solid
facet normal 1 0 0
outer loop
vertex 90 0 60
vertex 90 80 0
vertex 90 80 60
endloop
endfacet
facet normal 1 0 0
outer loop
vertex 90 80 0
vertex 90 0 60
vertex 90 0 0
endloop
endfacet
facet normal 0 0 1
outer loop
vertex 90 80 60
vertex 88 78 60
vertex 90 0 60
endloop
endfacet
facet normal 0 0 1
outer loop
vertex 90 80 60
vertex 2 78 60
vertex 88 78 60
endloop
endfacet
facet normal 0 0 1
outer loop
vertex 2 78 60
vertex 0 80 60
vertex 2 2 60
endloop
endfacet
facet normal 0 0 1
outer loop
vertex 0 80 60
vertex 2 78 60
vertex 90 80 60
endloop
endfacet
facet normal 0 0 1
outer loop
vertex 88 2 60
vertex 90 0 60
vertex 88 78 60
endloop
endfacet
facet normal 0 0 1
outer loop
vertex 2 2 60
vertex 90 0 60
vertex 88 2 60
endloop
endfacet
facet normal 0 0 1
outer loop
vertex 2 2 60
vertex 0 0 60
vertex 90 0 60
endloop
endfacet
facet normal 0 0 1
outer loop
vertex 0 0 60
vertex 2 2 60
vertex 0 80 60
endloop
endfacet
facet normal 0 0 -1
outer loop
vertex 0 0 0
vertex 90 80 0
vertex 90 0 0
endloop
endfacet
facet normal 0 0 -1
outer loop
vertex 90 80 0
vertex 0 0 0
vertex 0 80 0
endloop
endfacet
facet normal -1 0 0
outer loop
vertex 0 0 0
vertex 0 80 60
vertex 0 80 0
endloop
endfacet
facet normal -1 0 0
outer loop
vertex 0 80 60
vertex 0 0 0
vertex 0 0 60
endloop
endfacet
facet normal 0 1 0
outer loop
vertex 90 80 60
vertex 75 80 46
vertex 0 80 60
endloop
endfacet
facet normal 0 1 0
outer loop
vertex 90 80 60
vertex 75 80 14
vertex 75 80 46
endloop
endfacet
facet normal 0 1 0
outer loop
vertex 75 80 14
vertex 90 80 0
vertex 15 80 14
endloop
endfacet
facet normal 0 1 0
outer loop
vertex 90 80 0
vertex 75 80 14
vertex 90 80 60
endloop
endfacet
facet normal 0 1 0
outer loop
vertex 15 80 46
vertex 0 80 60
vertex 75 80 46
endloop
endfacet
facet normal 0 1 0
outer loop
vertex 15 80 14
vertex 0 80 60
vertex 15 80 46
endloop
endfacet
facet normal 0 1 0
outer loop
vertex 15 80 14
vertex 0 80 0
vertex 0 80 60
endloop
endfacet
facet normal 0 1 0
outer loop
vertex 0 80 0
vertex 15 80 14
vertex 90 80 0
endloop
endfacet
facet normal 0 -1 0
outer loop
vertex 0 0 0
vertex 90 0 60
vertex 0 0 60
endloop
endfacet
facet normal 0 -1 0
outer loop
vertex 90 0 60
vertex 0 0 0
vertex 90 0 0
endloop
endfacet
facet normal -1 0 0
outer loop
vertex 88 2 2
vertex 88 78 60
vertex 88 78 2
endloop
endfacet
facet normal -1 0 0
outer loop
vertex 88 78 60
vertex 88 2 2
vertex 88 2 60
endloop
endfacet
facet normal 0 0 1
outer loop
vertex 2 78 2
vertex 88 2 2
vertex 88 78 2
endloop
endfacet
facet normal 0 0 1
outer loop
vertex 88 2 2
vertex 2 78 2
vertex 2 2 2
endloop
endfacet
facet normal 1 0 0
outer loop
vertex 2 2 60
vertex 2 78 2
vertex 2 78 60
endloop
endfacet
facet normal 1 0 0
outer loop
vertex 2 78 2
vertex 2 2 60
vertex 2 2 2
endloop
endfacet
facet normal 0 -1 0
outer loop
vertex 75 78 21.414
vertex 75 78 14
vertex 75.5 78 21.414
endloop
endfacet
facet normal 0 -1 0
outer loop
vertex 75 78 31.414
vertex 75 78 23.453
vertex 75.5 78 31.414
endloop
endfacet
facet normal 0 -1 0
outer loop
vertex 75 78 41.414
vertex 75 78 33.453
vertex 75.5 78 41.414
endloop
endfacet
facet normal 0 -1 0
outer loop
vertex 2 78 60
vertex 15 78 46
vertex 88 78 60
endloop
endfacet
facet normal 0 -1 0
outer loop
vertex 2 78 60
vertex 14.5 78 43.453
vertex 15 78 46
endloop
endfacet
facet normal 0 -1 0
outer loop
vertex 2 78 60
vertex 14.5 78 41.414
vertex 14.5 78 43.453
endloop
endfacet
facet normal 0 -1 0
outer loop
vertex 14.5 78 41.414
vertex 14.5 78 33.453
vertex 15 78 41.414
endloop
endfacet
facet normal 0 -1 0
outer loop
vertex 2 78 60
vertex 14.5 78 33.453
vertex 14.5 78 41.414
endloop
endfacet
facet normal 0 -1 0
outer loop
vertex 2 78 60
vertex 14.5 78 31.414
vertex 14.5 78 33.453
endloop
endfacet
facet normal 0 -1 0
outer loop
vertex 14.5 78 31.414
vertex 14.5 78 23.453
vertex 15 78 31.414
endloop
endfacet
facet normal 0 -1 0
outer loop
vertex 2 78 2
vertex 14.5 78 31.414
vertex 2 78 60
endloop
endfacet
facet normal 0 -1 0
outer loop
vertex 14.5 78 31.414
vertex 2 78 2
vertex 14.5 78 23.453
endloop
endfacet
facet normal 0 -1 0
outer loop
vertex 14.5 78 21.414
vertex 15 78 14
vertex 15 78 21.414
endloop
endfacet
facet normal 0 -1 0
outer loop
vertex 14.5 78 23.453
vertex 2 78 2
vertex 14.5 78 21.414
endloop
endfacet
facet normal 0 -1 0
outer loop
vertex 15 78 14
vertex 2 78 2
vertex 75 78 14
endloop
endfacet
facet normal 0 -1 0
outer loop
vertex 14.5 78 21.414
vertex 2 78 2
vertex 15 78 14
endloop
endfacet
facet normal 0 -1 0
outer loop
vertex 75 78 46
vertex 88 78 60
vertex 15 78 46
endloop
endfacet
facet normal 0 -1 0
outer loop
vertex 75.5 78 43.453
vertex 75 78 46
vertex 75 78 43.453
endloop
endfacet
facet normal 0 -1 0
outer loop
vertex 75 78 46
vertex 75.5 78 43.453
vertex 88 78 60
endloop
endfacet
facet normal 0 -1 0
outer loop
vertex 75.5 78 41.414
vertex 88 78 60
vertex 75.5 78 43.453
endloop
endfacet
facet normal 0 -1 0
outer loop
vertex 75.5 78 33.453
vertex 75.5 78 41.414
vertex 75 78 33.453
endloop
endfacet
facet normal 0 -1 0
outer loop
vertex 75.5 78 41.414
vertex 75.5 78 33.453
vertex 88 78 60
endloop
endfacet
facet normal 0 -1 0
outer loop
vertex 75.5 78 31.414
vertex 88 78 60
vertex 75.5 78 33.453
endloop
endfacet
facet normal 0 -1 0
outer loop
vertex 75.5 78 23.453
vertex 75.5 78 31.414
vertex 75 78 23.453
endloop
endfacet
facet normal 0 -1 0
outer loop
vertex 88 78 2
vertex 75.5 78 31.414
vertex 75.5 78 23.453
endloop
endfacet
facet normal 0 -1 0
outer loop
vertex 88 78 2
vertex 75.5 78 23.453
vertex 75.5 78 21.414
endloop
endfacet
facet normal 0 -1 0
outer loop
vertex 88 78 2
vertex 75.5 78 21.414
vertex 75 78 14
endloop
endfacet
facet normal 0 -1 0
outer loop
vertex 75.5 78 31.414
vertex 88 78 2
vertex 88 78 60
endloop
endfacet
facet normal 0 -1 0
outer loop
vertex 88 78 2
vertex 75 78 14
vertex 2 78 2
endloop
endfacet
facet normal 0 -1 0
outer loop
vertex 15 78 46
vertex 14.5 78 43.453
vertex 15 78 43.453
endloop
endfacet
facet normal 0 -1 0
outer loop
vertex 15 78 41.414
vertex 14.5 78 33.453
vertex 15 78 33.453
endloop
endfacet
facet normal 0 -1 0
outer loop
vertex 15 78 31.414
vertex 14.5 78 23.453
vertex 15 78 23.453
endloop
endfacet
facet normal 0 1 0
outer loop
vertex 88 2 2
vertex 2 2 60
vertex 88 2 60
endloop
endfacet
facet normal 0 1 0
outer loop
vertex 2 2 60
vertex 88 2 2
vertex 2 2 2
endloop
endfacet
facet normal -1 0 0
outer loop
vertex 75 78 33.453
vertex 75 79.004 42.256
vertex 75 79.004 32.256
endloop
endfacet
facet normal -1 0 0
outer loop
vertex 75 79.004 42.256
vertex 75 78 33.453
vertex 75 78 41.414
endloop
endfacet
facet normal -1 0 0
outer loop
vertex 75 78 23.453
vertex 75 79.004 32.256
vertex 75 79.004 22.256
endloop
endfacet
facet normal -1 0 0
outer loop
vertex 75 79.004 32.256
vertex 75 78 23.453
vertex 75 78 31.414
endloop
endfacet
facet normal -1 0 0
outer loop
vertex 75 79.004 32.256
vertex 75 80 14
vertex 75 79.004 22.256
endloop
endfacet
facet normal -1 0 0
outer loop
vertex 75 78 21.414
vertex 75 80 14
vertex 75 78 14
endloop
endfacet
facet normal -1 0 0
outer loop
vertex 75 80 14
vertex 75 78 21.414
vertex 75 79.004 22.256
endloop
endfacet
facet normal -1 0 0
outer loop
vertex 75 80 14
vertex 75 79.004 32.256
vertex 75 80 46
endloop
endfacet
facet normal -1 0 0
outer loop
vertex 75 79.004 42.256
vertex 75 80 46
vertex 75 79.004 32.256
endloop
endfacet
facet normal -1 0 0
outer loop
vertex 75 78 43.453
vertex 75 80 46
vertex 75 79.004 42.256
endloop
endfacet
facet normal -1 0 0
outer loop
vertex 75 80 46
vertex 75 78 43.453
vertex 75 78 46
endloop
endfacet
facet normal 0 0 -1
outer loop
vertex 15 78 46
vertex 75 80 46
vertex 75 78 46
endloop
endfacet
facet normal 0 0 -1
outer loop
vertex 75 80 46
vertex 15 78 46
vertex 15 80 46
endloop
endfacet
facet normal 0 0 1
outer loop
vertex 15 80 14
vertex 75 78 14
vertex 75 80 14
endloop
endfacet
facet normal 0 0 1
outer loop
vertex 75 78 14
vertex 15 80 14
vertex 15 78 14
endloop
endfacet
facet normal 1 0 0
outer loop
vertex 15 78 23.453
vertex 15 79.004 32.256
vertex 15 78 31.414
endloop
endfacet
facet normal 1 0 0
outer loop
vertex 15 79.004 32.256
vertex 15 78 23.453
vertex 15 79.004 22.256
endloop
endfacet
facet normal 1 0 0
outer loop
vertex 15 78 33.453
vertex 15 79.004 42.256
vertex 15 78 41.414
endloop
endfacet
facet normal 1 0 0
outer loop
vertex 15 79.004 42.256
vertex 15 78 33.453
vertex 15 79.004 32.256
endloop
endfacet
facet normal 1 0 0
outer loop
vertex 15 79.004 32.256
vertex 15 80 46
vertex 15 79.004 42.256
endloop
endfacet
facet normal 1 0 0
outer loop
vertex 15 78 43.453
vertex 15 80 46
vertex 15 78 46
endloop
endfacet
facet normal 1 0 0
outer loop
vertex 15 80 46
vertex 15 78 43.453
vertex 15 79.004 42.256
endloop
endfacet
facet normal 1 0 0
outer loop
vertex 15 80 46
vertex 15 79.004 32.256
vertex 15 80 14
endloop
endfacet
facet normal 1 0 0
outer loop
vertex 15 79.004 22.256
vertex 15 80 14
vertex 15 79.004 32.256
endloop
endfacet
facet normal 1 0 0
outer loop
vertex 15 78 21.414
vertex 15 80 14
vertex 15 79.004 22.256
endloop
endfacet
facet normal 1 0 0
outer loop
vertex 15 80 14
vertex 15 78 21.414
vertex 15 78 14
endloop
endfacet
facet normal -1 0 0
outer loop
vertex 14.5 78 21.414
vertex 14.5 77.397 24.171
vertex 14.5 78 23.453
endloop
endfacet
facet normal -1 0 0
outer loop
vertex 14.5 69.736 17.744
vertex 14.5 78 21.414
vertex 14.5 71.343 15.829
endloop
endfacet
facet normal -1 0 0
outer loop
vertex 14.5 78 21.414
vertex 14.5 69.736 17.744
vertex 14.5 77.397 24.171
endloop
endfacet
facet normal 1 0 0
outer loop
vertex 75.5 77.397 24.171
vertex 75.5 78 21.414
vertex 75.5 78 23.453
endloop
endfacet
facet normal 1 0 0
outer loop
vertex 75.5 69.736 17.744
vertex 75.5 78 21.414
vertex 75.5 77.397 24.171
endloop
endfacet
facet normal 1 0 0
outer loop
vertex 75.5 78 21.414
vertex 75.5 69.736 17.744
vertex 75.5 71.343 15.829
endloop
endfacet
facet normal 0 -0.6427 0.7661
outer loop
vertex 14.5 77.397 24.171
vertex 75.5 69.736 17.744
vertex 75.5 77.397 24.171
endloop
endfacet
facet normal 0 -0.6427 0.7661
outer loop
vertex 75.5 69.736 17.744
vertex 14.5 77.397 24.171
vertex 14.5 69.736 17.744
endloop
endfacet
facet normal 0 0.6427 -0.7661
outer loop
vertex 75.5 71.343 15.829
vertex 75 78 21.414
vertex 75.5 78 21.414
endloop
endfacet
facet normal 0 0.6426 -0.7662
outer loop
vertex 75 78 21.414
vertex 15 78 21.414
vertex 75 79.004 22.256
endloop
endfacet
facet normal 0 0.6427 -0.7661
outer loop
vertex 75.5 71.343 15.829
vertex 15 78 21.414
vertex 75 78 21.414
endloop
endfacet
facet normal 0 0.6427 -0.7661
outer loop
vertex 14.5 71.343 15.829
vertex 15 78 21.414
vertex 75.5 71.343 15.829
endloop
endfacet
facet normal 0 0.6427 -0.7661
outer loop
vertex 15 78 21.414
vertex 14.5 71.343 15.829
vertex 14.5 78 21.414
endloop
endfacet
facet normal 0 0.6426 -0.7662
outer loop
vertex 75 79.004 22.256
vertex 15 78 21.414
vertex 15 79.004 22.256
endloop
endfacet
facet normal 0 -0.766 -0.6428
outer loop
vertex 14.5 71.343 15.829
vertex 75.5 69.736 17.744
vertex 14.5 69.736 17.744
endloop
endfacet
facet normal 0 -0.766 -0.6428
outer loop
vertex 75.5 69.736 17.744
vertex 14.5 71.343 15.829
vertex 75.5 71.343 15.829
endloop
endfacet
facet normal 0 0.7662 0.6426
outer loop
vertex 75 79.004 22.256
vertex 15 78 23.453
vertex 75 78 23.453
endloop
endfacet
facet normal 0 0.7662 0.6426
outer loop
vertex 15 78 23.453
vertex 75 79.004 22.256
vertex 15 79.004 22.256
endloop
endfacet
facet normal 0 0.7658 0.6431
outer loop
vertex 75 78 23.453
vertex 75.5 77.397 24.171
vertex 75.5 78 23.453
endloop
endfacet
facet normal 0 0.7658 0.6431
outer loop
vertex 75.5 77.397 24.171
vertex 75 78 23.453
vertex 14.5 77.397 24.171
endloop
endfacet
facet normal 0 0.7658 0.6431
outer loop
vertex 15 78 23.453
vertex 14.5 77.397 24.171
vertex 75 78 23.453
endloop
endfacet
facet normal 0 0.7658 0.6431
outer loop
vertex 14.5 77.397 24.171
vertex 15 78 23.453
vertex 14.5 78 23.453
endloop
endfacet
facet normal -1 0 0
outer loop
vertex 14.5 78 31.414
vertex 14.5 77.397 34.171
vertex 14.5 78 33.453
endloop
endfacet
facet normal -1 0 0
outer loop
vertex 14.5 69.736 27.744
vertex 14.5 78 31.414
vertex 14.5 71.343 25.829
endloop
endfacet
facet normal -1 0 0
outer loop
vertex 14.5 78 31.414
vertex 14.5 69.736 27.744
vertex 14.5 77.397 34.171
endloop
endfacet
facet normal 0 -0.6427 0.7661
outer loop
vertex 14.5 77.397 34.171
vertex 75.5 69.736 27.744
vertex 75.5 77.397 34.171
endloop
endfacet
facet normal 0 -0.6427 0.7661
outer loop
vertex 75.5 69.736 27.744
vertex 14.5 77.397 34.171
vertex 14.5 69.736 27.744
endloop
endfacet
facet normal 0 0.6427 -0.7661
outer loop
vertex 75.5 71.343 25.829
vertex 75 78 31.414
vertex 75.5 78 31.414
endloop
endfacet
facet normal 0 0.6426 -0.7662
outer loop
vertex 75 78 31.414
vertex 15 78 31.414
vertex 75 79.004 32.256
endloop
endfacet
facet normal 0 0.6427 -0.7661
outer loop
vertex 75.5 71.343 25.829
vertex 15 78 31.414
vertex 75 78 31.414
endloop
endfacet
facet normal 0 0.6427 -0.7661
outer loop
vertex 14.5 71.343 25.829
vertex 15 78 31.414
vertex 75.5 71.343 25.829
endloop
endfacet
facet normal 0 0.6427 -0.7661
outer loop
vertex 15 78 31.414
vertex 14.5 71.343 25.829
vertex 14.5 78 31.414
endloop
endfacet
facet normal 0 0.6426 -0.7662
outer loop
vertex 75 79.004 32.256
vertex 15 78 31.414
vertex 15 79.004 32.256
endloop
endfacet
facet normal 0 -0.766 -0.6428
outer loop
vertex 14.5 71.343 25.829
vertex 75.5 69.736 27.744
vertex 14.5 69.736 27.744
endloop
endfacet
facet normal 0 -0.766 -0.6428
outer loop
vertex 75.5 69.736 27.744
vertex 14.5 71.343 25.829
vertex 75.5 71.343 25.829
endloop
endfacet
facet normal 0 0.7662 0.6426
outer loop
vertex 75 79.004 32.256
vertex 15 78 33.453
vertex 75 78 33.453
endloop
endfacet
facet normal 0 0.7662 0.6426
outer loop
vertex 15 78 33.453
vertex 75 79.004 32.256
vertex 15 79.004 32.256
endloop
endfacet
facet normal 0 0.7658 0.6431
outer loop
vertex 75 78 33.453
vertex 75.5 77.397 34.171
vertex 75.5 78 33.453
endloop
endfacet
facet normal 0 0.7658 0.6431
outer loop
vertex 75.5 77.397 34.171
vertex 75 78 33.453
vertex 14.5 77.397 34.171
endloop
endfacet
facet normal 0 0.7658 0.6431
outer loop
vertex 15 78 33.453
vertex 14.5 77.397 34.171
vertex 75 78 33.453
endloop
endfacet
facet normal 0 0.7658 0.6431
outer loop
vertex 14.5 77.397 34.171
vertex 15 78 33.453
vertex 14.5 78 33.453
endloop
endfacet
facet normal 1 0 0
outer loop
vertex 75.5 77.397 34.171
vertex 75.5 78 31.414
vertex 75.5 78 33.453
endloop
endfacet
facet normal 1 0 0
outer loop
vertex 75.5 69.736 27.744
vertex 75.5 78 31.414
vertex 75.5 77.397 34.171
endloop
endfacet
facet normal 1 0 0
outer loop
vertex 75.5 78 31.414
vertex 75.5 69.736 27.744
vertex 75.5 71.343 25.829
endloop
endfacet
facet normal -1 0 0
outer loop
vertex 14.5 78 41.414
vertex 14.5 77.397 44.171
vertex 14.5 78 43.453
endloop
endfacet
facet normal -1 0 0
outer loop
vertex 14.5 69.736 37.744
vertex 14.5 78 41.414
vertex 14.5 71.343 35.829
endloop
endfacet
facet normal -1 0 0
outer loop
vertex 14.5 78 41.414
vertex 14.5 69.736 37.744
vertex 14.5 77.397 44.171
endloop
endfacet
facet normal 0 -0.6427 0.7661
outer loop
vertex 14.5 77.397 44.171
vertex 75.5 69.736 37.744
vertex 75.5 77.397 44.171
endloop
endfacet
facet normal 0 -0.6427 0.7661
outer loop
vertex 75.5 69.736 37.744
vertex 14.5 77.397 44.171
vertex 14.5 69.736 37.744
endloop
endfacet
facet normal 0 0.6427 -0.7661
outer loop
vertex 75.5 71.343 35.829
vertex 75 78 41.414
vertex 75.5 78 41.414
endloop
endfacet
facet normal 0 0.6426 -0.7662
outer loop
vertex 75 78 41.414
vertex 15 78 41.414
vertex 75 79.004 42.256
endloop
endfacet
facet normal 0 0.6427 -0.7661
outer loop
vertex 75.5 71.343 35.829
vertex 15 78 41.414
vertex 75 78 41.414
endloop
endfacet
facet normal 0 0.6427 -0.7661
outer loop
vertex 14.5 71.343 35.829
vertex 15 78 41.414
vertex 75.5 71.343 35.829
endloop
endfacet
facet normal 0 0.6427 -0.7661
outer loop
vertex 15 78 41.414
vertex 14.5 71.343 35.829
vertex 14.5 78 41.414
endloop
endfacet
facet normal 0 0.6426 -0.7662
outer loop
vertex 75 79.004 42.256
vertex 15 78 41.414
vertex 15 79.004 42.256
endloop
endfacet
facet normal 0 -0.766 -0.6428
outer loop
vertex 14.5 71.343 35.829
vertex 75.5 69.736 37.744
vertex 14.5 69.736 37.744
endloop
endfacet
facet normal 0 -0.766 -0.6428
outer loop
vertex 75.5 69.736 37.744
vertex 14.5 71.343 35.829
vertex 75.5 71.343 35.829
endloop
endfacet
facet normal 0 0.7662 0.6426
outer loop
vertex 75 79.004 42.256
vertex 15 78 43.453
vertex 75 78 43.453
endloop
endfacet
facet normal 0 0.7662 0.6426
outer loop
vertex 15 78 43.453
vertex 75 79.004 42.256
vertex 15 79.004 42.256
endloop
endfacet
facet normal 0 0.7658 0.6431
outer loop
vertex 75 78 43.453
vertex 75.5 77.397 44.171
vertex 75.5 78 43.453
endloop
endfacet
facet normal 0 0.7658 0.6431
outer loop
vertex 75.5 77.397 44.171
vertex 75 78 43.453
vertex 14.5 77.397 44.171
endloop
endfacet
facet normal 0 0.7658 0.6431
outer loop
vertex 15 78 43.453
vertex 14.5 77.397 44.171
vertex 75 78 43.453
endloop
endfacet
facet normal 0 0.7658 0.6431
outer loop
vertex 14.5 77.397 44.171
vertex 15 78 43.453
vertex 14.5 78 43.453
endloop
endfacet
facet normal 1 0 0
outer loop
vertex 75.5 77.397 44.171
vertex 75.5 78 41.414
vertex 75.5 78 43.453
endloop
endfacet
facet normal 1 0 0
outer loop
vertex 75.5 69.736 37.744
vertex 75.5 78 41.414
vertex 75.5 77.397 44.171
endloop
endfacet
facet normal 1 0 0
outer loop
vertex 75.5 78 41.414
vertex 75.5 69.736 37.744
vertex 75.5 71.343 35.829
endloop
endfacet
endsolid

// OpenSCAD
$fn = 32;

// ----------------------------------------------------------------------
// Vent box: louvers enclosure
// ----------------------------------------------------------------------

// --- parameters (mm) ---
box_l = 90;               // box length, X
box_w = 80;               // box width, Y
box_h = 60;               // box height, Z
wall_t = 2;               // shell wall thickness
win_l = 60;               // vent window width, X
win_h = 32;               // vent window height, Z
slat_t = 2.5;             // louver slat thickness
slat_d = 10;              // louver slat depth
slat_a = 40;              // louver slat angle, degrees
slat_pitch = 10;          // louver pitch
slat_yc = 74.37;          // slat centreline Y

win_z0 = (box_h - win_h) / 2;  // window lower edge Z
n_slats = 3;  // louver count
slat_z0 = win_z0 + (win_h - (n_slats - 1) * slat_pitch) / 2;

difference() {
  union() {
    difference() {
      cube([box_l, box_w, box_h]);
  translate([wall_t, wall_t, wall_t])
    cube([box_l - 2 * wall_t, box_w - 2 * wall_t, box_h]);
  translate([(box_l - win_l) / 2, box_w - wall_t - 1, win_z0])
    cube([win_l, wall_t + 2, win_h]);
    }
    for (i = [0 : n_slats - 1])
      translate([box_l / 2, slat_yc, slat_z0 + i * slat_pitch])
        rotate([slat_a, 0, 0])
          cube([win_l + 1, slat_d, slat_t], center = true);
  }
}
